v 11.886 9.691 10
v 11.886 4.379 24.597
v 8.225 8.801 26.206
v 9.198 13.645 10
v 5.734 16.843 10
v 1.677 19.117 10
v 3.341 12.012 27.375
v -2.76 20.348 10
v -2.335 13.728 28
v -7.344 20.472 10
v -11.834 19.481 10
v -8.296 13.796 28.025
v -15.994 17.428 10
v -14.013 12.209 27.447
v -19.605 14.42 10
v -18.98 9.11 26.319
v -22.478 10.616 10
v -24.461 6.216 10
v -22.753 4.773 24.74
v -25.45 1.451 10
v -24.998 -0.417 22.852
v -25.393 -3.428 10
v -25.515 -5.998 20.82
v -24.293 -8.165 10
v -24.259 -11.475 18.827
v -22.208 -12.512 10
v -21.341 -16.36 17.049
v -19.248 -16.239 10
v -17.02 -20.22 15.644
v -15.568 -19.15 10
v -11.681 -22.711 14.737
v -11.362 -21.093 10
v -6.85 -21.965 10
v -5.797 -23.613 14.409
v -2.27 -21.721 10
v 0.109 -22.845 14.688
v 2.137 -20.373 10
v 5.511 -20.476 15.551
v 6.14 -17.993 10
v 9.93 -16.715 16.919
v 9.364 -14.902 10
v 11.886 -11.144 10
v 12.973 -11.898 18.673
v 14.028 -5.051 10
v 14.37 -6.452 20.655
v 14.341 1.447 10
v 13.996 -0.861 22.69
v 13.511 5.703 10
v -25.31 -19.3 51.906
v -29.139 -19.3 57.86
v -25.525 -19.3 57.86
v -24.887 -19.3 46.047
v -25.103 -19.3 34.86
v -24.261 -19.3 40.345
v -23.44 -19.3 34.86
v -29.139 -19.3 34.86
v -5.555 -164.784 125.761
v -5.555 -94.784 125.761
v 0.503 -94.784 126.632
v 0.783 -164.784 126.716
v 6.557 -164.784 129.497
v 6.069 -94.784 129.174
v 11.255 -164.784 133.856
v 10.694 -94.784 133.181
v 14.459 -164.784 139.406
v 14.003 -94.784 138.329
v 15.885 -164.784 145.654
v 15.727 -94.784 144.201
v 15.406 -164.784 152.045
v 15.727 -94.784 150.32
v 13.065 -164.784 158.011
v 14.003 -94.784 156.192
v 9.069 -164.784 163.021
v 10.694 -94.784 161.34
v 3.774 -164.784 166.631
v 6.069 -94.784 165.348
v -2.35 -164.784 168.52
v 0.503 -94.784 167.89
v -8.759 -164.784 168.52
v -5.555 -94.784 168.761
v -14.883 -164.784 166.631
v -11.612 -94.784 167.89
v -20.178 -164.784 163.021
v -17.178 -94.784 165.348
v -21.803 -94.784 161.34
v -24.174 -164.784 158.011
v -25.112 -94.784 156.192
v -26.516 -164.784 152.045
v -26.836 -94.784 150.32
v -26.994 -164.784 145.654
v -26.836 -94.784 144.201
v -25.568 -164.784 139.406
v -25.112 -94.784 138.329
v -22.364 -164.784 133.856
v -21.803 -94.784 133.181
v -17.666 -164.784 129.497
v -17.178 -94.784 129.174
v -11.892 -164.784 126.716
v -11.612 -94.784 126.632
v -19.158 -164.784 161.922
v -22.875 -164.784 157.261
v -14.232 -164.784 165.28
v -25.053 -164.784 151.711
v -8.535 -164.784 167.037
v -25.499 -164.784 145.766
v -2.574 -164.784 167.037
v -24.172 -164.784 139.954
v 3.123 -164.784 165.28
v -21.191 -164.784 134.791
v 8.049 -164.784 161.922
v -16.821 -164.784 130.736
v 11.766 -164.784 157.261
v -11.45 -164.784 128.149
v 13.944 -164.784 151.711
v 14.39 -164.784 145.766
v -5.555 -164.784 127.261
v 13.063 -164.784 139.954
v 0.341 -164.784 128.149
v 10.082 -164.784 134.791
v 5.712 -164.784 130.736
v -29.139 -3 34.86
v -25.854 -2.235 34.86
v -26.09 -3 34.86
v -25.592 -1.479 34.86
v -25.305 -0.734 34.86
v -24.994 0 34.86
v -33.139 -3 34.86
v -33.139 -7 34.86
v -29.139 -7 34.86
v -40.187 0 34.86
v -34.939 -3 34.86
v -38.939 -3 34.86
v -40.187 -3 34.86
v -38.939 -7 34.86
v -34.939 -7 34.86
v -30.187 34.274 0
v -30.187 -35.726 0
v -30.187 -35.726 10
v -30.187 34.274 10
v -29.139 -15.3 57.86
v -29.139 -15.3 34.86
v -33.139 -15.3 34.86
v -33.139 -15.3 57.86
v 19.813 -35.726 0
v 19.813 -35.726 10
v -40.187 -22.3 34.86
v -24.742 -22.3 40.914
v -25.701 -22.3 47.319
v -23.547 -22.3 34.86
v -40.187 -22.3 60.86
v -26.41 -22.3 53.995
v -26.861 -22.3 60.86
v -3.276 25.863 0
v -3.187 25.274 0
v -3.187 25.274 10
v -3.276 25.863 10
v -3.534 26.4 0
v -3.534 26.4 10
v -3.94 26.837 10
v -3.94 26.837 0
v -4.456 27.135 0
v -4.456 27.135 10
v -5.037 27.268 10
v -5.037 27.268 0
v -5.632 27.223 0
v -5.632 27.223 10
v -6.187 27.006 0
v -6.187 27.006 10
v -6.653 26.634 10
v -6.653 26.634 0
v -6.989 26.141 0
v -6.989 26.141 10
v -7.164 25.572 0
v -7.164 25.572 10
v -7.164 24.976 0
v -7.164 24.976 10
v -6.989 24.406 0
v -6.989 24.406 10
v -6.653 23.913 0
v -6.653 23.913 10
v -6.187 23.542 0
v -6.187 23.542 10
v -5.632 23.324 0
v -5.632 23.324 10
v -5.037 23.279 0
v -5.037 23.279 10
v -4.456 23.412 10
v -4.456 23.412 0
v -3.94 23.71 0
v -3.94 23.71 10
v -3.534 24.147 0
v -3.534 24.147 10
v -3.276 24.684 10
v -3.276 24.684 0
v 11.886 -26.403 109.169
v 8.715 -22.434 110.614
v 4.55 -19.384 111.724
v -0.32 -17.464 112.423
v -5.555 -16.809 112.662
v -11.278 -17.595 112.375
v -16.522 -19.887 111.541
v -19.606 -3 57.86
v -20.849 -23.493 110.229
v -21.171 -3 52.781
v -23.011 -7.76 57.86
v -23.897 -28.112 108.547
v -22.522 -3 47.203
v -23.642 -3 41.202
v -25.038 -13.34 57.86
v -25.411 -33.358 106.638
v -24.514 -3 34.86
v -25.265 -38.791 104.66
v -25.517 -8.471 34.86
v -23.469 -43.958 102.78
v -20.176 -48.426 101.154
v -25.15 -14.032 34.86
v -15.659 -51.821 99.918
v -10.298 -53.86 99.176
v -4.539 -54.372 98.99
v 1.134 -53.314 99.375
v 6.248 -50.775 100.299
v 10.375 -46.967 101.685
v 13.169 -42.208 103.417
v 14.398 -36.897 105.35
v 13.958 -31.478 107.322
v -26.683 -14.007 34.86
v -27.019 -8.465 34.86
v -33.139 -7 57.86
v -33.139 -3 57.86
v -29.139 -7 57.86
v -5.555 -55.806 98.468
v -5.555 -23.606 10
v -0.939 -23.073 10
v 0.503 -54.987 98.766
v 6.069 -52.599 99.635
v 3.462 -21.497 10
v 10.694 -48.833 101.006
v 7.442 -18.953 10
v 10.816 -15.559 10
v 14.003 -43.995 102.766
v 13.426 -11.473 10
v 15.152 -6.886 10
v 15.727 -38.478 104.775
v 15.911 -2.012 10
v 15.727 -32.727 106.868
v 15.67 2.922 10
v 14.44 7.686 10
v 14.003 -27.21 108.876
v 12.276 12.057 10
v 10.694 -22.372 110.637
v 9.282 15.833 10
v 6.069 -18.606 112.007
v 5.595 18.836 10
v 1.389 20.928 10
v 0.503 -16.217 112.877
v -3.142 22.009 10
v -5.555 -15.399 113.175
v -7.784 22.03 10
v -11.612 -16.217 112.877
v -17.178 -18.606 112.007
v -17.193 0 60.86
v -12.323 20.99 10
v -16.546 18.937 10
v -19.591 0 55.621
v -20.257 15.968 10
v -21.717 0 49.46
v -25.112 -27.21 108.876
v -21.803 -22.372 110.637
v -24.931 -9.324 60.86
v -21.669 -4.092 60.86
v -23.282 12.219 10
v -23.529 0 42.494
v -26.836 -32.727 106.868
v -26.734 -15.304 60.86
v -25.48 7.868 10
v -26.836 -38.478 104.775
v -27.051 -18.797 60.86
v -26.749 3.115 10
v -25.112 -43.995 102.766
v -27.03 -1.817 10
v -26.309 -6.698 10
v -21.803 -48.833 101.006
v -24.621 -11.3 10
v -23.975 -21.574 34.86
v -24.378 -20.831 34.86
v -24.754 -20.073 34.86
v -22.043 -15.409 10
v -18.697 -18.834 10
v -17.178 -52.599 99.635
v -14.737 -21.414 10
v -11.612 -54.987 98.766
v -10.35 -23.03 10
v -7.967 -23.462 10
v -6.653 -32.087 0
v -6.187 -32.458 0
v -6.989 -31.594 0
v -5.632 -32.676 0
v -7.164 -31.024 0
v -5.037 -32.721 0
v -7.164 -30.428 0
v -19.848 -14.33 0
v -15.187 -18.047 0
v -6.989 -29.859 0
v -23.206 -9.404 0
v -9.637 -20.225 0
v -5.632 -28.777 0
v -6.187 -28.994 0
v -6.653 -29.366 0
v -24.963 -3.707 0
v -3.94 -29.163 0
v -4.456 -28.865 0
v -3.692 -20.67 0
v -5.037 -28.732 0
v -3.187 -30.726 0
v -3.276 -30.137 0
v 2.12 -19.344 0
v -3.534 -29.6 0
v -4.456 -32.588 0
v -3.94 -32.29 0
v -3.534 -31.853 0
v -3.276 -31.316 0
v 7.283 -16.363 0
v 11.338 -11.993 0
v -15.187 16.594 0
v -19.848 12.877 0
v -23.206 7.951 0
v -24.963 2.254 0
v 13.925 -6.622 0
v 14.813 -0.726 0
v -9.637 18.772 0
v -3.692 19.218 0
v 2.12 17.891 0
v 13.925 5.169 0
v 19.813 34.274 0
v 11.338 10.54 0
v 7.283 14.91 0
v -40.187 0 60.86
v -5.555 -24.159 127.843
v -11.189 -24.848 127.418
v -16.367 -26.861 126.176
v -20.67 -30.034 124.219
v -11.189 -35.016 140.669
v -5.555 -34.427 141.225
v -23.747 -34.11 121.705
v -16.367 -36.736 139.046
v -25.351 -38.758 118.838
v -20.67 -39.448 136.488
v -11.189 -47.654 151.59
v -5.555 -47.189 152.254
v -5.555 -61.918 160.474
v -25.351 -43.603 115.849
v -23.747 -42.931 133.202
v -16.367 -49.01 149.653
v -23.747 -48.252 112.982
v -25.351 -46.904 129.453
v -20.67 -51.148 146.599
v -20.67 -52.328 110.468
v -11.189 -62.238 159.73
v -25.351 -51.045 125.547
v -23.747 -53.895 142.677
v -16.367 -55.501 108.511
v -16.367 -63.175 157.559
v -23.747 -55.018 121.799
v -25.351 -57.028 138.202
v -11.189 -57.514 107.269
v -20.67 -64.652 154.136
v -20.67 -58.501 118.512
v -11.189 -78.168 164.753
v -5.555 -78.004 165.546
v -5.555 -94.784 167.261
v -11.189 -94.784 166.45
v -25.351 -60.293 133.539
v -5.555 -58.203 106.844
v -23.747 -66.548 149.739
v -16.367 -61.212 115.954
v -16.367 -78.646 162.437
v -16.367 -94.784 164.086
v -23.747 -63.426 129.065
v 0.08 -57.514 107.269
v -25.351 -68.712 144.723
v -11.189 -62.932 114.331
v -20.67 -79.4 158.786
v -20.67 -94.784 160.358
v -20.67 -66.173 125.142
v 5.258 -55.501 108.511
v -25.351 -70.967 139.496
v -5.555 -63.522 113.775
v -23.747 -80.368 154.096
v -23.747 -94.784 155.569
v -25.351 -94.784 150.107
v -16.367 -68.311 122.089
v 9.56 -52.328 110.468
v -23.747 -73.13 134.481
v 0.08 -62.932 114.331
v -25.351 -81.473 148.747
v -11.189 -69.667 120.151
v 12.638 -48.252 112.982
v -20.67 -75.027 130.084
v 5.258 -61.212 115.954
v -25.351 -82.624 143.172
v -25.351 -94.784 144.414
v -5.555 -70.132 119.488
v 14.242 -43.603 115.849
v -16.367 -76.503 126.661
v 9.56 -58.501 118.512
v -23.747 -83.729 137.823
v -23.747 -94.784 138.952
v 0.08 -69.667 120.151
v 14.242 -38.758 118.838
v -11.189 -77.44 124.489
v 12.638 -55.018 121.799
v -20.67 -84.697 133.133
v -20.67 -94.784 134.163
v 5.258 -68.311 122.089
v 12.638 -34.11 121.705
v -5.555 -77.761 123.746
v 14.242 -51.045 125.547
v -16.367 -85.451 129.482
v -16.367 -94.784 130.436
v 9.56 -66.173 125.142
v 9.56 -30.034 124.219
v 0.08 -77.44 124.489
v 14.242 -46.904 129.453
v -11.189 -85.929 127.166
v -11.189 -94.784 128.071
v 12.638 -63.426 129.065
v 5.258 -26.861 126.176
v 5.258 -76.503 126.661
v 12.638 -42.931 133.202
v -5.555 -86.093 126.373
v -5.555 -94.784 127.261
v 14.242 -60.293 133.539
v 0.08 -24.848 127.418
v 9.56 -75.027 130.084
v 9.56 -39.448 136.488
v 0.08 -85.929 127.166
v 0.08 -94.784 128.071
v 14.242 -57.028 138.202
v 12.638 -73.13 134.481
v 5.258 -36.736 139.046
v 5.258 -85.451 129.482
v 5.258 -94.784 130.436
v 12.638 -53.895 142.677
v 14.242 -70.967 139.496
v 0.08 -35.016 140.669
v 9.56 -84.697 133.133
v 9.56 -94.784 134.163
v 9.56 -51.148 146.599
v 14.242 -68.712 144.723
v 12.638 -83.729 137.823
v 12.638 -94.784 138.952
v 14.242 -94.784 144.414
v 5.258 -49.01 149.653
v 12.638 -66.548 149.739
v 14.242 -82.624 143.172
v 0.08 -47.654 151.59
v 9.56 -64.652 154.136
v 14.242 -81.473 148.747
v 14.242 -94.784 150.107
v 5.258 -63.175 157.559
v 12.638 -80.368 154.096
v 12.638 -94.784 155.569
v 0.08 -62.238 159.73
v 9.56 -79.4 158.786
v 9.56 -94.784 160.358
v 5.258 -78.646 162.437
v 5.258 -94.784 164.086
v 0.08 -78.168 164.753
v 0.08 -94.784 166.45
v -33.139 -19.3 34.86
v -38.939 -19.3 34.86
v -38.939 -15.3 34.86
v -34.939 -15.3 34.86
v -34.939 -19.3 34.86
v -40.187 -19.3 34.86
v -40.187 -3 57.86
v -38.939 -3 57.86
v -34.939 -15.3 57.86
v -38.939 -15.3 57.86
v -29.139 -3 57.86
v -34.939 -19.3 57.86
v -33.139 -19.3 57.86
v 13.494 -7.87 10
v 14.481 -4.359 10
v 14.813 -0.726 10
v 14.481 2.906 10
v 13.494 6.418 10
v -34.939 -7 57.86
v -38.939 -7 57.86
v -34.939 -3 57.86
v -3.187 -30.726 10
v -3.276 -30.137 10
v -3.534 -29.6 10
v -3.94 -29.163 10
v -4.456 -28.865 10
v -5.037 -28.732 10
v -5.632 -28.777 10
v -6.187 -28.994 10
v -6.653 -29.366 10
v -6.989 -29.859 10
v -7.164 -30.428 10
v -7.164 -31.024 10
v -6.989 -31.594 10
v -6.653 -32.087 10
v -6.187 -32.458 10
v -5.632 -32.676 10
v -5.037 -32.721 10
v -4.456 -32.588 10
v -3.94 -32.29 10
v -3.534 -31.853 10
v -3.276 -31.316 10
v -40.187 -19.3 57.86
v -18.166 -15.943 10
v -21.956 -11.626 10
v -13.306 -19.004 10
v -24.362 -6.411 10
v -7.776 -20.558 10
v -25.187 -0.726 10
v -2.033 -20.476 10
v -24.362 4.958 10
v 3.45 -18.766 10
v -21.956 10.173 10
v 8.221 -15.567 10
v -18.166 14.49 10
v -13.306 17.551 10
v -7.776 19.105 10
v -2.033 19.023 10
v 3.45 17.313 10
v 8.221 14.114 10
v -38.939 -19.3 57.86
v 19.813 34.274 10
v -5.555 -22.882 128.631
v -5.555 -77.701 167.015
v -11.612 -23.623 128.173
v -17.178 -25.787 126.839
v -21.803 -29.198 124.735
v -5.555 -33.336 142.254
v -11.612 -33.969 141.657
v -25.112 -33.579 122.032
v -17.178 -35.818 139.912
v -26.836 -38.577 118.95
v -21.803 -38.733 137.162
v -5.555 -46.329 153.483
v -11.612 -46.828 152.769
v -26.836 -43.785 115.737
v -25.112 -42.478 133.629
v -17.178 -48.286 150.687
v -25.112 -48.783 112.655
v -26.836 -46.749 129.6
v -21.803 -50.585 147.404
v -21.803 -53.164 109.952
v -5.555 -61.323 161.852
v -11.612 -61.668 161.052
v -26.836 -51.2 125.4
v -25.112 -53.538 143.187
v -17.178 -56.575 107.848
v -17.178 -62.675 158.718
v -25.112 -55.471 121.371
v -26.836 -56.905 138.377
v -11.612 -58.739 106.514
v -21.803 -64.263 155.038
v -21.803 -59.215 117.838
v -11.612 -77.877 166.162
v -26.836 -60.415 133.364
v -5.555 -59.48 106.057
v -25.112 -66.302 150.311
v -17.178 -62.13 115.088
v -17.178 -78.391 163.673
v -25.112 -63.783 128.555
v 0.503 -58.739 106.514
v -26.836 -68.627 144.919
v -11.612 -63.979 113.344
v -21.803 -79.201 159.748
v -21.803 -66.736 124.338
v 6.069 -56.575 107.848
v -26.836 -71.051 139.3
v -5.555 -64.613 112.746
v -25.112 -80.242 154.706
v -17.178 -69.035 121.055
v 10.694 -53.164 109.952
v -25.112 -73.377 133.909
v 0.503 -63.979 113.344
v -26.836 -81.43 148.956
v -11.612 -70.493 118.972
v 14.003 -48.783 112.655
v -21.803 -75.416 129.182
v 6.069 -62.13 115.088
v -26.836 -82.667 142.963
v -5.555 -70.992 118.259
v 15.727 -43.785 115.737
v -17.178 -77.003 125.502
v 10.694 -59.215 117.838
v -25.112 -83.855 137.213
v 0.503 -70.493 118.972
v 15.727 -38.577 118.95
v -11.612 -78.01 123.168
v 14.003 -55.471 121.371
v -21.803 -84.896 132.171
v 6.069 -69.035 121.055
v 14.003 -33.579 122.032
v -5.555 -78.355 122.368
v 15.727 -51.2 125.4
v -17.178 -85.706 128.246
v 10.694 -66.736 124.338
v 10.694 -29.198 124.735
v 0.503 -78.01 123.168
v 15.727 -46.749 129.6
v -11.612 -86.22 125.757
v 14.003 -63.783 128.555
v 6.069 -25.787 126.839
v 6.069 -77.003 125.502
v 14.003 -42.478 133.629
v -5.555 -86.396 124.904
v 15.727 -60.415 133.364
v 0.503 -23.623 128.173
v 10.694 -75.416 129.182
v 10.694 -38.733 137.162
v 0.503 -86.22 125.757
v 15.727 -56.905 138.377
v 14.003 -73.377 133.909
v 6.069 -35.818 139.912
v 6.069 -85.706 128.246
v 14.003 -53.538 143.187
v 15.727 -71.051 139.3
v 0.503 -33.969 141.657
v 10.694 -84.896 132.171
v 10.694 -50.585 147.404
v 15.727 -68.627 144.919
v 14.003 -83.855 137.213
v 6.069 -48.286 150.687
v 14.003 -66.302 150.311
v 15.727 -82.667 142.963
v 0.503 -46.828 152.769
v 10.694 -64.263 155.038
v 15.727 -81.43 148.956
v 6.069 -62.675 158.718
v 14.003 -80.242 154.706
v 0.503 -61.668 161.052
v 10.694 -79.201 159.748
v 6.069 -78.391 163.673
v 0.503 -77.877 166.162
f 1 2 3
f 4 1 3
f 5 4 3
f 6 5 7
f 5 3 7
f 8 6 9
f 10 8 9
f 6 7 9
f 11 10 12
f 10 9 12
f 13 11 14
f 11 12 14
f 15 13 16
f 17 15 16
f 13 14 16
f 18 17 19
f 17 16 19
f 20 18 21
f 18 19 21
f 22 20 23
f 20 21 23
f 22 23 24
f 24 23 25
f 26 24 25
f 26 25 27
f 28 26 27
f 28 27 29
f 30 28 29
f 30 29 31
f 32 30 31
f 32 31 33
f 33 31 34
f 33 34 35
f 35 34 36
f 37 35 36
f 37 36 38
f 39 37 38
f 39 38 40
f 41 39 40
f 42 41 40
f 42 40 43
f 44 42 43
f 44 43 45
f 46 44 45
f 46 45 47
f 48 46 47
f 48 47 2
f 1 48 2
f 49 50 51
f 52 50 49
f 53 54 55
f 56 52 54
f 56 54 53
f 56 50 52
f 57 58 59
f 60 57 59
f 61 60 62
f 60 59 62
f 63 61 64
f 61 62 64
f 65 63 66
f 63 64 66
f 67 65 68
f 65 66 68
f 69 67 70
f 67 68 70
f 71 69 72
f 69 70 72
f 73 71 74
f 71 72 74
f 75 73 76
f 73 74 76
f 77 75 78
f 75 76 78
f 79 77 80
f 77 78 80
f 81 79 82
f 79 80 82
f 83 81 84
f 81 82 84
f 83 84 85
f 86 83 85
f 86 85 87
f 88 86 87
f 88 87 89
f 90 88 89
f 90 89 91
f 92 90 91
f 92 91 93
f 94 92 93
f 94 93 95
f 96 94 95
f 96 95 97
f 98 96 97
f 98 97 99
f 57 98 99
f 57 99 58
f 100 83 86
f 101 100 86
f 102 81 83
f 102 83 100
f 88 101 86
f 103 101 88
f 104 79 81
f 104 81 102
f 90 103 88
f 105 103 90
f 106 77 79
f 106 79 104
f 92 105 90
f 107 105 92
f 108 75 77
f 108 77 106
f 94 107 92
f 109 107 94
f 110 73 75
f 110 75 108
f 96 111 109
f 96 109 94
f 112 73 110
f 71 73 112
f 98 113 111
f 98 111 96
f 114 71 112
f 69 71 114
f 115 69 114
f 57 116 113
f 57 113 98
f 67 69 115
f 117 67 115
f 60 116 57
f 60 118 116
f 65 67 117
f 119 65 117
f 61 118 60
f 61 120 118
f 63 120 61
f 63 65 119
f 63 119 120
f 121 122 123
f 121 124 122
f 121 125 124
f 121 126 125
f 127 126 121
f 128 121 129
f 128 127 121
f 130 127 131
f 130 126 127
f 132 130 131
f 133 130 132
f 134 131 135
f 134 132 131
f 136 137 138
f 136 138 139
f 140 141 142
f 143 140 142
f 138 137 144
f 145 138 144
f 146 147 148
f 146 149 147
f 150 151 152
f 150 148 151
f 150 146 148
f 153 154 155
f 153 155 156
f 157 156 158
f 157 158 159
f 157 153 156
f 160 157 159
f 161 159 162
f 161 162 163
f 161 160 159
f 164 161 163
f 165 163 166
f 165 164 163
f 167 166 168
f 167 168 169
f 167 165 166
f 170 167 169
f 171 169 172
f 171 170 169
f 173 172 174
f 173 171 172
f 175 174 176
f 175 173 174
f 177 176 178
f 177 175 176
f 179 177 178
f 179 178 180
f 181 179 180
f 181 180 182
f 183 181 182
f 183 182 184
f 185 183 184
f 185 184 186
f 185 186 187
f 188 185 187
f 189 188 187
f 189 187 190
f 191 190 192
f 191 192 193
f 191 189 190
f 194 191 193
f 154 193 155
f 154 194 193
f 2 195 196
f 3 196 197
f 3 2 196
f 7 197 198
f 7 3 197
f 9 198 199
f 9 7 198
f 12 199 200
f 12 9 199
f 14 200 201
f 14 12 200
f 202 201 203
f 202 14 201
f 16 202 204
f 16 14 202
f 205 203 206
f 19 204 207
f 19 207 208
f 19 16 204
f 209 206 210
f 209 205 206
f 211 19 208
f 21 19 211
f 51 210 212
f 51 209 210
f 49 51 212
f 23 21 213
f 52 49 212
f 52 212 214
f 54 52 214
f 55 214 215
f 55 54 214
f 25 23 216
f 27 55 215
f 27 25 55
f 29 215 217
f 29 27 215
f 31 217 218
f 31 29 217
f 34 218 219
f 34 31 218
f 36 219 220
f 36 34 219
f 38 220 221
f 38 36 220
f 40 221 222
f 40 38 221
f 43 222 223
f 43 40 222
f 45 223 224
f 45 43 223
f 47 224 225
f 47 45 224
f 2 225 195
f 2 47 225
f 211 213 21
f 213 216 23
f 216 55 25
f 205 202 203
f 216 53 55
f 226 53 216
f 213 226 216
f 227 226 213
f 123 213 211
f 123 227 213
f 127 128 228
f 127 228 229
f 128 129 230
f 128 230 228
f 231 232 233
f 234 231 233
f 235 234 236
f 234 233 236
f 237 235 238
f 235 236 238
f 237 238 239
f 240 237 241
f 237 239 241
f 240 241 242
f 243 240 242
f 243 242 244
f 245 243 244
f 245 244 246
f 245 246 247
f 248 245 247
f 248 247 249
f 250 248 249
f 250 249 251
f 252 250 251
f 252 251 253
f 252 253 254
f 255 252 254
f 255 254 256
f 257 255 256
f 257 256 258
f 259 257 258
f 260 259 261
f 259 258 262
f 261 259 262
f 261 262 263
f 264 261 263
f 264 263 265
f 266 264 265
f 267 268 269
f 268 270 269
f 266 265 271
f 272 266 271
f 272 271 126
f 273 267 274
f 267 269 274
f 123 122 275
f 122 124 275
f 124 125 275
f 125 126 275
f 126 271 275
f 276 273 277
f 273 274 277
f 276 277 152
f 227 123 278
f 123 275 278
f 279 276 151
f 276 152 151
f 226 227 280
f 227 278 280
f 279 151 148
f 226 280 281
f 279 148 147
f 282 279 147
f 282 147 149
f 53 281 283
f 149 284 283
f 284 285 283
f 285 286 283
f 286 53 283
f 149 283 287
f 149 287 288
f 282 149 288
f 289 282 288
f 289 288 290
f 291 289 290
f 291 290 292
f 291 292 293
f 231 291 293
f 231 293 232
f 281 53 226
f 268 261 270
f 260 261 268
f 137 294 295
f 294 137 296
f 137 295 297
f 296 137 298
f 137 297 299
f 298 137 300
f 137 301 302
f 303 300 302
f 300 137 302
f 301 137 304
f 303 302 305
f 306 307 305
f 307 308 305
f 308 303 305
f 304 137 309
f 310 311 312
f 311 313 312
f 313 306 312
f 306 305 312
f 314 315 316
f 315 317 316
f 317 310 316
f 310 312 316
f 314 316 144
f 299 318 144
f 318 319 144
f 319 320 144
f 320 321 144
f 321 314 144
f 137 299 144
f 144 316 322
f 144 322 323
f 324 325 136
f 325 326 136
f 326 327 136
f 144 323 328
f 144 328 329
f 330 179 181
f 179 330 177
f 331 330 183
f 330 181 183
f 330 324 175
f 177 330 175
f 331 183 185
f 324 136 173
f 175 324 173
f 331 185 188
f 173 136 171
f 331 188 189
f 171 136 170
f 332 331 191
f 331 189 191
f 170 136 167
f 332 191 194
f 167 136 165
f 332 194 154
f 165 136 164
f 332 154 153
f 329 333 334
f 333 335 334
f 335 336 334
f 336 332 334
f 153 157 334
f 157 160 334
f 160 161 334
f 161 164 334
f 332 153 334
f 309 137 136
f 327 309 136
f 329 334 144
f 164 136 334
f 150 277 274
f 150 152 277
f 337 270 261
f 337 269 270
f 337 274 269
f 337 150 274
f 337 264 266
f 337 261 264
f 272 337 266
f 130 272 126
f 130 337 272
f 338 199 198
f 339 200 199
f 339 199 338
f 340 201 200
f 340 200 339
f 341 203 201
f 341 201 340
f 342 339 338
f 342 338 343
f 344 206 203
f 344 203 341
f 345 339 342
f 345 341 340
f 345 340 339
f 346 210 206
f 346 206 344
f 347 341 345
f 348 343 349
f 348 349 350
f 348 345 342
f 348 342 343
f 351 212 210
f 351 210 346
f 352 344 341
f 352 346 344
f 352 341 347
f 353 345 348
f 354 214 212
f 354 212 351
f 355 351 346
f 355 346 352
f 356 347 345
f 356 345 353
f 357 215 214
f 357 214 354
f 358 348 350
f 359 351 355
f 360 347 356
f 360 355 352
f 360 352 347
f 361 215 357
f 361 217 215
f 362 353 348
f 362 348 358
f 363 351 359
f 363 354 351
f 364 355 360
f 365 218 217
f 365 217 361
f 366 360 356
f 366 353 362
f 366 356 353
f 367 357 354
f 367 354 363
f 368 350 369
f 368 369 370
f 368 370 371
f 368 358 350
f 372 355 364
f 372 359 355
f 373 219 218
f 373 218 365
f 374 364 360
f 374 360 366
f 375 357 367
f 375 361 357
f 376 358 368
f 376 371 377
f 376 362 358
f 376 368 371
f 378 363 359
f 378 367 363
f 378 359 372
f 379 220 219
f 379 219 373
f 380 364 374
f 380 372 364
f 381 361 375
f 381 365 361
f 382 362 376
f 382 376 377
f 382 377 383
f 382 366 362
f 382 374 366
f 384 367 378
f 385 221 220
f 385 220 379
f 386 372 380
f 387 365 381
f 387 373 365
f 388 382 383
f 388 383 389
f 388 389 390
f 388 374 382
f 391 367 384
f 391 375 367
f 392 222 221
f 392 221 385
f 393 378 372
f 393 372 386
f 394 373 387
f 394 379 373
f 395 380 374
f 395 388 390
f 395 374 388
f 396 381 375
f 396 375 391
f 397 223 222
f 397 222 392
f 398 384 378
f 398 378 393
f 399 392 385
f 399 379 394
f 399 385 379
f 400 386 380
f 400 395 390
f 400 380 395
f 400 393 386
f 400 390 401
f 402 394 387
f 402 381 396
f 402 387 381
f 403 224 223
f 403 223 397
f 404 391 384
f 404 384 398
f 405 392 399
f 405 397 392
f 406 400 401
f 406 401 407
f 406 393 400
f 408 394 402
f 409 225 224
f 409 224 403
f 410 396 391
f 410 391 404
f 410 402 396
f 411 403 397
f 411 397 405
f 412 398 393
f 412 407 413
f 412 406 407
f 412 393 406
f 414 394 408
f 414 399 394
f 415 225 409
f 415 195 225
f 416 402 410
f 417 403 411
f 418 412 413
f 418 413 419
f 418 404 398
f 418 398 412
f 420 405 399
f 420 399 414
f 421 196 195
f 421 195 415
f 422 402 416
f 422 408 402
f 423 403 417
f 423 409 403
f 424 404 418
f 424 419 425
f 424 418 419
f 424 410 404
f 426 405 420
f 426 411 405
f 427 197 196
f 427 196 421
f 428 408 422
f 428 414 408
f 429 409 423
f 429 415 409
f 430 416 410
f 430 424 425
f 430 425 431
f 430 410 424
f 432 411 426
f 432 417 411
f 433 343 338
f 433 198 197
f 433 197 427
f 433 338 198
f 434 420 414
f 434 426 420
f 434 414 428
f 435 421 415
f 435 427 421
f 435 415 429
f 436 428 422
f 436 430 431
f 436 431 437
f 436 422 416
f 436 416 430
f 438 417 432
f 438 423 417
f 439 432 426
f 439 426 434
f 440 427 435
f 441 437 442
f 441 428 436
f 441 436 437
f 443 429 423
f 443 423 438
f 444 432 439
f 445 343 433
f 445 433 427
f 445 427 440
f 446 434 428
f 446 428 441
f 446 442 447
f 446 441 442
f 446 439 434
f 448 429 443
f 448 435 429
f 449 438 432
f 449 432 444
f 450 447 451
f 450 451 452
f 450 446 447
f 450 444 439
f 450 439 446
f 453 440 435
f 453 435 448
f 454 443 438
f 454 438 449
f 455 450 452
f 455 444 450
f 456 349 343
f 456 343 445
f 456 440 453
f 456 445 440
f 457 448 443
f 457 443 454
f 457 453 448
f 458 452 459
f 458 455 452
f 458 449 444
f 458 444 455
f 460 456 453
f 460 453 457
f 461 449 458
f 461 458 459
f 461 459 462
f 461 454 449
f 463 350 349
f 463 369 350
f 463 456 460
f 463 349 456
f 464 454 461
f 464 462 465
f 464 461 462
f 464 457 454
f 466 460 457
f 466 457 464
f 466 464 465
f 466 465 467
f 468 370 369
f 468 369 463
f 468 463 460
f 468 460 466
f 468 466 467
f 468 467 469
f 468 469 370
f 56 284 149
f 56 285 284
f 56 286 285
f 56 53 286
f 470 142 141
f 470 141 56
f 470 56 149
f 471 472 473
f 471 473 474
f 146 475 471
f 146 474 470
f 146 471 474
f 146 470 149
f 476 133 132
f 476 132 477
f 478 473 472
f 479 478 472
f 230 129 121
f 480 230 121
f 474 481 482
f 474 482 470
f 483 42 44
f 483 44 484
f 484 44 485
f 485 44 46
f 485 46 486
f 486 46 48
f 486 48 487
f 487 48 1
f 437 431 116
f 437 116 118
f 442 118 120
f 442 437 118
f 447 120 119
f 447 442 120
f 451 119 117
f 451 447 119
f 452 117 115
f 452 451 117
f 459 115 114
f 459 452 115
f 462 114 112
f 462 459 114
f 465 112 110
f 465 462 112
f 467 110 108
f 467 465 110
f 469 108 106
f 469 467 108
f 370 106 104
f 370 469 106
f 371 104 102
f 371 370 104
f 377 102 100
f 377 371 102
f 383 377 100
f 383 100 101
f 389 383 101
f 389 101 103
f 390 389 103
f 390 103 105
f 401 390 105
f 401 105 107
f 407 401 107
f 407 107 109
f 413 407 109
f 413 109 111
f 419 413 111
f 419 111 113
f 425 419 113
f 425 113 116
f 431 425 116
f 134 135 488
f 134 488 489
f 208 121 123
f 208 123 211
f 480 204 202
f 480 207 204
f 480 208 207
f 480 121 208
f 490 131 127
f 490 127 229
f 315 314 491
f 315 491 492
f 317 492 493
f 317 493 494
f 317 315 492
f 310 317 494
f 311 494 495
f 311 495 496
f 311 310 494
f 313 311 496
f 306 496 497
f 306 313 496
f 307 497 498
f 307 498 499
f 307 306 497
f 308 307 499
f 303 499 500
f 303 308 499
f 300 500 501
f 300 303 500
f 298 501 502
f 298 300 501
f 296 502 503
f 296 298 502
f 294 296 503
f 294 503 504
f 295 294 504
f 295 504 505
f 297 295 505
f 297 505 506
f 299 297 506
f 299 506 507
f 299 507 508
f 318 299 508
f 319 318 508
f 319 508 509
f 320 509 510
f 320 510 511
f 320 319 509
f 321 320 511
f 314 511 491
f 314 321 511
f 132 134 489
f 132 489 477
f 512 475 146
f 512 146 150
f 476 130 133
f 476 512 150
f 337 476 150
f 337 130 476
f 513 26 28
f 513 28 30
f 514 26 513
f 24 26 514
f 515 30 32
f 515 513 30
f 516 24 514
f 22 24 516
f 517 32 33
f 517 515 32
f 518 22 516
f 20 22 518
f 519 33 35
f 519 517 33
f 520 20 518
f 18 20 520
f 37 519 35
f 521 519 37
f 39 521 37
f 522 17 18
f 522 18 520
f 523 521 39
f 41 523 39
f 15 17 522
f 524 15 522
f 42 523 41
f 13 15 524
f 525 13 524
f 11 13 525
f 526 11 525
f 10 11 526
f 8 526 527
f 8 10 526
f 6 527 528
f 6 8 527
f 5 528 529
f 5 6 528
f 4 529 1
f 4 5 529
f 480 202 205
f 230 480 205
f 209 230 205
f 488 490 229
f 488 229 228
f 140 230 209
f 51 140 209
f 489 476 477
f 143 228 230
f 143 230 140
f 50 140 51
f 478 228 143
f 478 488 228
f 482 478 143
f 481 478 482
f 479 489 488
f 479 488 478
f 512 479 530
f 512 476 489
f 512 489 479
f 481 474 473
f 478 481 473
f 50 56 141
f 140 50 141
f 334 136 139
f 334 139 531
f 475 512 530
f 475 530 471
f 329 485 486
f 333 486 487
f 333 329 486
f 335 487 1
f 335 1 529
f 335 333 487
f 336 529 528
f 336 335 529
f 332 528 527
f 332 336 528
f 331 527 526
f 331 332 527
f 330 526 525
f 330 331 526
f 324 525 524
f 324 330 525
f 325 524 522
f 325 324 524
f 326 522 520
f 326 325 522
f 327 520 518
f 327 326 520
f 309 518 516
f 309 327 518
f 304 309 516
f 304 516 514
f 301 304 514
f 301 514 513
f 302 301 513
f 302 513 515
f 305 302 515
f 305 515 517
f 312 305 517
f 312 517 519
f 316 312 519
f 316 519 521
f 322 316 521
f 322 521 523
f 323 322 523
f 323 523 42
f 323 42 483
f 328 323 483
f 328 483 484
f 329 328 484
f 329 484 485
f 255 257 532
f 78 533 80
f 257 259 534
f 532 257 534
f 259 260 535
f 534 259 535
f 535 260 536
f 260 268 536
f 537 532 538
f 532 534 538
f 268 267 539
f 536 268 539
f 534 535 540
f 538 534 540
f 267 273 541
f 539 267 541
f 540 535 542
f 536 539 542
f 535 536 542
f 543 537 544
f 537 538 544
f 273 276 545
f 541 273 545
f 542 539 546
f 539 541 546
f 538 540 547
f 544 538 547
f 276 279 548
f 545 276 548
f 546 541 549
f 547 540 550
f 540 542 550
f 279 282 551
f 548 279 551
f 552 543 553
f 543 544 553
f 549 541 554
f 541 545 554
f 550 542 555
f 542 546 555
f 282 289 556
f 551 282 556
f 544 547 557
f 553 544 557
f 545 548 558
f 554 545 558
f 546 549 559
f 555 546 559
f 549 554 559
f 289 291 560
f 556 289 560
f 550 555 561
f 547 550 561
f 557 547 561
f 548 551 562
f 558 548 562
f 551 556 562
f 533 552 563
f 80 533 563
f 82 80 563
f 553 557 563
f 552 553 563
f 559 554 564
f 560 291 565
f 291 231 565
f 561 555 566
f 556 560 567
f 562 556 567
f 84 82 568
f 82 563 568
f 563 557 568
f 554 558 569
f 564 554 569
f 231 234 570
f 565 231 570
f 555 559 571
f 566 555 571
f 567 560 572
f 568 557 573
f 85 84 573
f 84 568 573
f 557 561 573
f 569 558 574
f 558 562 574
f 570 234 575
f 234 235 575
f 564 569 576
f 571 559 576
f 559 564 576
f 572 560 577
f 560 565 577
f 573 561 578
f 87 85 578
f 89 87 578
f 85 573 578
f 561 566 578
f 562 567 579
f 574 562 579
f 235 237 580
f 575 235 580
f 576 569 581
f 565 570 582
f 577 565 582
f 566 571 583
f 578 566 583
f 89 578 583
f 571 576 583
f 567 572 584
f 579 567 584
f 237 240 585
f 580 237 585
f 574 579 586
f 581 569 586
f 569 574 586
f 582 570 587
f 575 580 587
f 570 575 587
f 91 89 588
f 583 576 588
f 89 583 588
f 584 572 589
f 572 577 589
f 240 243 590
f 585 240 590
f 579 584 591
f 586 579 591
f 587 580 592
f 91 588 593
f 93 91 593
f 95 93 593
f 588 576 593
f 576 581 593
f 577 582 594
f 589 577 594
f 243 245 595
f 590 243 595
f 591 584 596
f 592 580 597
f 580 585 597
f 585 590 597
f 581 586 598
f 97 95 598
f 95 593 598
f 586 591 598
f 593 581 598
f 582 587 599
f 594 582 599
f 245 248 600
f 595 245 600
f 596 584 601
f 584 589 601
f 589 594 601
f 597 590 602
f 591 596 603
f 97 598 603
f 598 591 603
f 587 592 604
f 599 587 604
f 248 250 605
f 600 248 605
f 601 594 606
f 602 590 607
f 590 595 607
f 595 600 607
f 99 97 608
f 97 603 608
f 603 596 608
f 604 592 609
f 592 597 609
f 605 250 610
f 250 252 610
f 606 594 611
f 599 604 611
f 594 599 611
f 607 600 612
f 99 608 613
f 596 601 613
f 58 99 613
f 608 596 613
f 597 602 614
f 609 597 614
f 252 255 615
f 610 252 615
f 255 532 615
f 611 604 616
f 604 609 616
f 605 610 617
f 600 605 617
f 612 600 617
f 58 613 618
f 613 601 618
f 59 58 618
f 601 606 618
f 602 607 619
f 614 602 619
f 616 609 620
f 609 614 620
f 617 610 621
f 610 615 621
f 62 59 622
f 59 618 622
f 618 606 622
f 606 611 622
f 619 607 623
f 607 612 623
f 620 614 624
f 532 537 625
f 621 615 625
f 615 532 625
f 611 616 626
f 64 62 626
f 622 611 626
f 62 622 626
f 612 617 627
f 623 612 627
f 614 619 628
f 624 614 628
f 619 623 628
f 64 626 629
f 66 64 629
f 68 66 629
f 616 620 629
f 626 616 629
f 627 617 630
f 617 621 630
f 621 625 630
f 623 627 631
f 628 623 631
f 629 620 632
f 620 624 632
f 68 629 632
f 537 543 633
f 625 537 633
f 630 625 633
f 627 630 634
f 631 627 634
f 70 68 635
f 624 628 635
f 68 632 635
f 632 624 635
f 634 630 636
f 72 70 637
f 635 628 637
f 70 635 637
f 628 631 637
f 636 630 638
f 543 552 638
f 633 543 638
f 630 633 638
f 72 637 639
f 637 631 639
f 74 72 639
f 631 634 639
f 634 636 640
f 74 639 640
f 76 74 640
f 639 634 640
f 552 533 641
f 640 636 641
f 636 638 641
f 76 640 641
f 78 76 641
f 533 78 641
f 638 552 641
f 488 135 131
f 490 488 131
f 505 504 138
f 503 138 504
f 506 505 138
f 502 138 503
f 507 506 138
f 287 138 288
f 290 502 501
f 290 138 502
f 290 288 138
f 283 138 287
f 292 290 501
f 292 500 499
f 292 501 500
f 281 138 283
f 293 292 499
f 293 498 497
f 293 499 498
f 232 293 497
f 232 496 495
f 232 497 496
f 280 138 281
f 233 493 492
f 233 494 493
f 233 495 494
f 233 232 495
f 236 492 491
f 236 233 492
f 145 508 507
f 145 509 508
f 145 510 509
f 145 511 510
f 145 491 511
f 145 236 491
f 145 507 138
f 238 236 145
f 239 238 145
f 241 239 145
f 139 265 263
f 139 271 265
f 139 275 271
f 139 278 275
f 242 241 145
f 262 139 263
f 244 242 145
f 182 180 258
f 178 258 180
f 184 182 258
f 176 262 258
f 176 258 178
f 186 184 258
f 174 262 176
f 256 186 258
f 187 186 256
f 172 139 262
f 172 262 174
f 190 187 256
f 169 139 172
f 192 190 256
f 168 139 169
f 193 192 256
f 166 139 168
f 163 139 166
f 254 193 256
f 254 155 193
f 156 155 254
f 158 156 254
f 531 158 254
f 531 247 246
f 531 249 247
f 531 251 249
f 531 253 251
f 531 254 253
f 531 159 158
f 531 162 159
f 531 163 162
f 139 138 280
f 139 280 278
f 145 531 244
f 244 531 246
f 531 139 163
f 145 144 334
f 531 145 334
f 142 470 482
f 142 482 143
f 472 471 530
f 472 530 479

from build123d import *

# Parameters (mm, degrees)
ESQUISSE1_W                         = 50
ESQUISSE1_H                         = 70
ESQUISSE1_R                         = 2
ESQUISSE1_R_2                       = 20
BOSS_EXTRU_1_DEPTH                  = 10
BOSS_EXTRU_2_REACH                  = 57.317
ESQUISSE13_R                        = 21.5
ESQUISSE13_R_2                      = 20
BOSS_EXTRU_2_DIRECTION_2_DEPTH      = 90
ESQUISSE19_R                        = 21.5
ESQUISSE19_R_2                      = 20
R_VOLUTION5_ANGLE                   = 70
ESQUISSE23_R                        = 21.5
ESQUISSE23_R_2                      = 20
BOSS_EXTRU_3_DEPTH                  = 70
ESQUISSE24_W                        = 23
ESQUISSE24_H                        = 16.3
ENL_V_MAT_EXTRU_1_DEPTH             = 10
BOSS_EXTRU_4_DEPTH                  = 13
BOSS_EXTRU_4_DIRECTION_2_REACH      = 242.506
BOSS_EXTRU_4_DIRECTION_2_END_RADIUS = 21.5
ESQUISSE28_W                        = 4
ESQUISSE28_H                        = 4
BOSS_EXTRU_5_DEPTH                  = 23


with BuildPart() as part:
    # Esquisse1 → Boss.-Extru.1 (new body)
    with BuildSketch(Plane.XY):
        with Locations((-5.186655458, -0.726415094)):
            Rectangle(ESQUISSE1_W, ESQUISSE1_H)
        with Locations((-5.186655458, 25.273584906)):
            Circle(ESQUISSE1_R, mode=Mode.SUBTRACT)
        with Locations((-5.186655458, -30.726415094)):
            Circle(ESQUISSE1_R, mode=Mode.SUBTRACT)
        with Locations((-5.186655458, -0.726415094)):
            Circle(ESQUISSE1_R_2, mode=Mode.SUBTRACT)
    extrude(amount=BOSS_EXTRU_1_DEPTH)

    # Boss.-Extru.2: up to this plane
    boss_extru_2_end = Plane(origin=(0, 0, 10), z_dir=(0, 0, 1))
    # Esquisse13 → Boss.-Extru.2 (add, up to the surface)
    with BuildSketch(Plane(origin=(0, -7.393134718, 20.312470696), x_dir=(1, 0, 0), z_dir=(0, -0.34202014332566283, 0.9396926207859106)), mode=Mode.PRIVATE) as boss_extru_2_sk1:
        with Locations(Location((-5.554517745, 2.737594529, 0), (0, 0, 270))):
            Circle(ESQUISSE13_R)
        with Locations(Location((-5.554517745, 2.737594529, 0), (0, 0, 29.306498897))):
            Circle(ESQUISSE13_R_2, mode=Mode.SUBTRACT)
    boss_extru_2_tool1 = split(extrude(boss_extru_2_sk1.sketch, amount=-BOSS_EXTRU_2_REACH, mode=Mode.PRIVATE), bisect_by=boss_extru_2_end, keep=Keep.BOTH, mode=Mode.PRIVATE)
    add(boss_extru_2_tool1.solids().sort_by_distance((-5.554518, 14.811316, 28.39423))[0])

    # Esquisse13 → Boss.-Extru.2 direction 2 (add)
    with BuildSketch(Plane(origin=(0, -7.393134718, 20.312470696), x_dir=(1, 0, 0), z_dir=(0, -0.34202014332566283, 0.9396926207859106))):
        with Locations(Location((-5.554517745, 2.737594529, 0), (0, 0, 270))):
            Circle(ESQUISSE13_R)
        with Locations(Location((-5.554517745, 2.737594529, 0), (0, 0, 29.306498897))):
            Circle(ESQUISSE13_R_2, mode=Mode.SUBTRACT)
    extrude(amount=BOSS_EXTRU_2_DIRECTION_2_DEPTH)

    # Esquisse19 → Révolution5 (revolve)
    with BuildSketch(Plane(origin=(0, -38.174947617, 104.884806567), x_dir=(1, 0, 0), z_dir=(0, -0.34202014332566294, 0.9396926207859106))):
        with Locations(Location((-5.554517745, 2.737594529, 0), (0, 0, 90))):
            Circle(ESQUISSE19_R)
        with Locations(Location((-5.554517745, 2.737594529, 0), (0, 0, 90))):
            Circle(ESQUISSE19_R_2, mode=Mode.SUBTRACT)
    revolve(axis=Axis((-5.554579986, -94.784211414, 84.280719561), (1, 0, 0)), revolution_arc=R_VOLUTION5_ANGLE)

    # Esquisse23 → Boss.-Extru.3 (add)
    with BuildSketch(Plane.XZ.offset(94.784211414)):
        with Locations(Location((-5.554579986, 147.260634339, 0), (0, 0, 270))):
            Circle(ESQUISSE23_R)
        with Locations(Location((-5.554579986, 147.260634339, 0), (0, 0, 270.000178307))):
            Circle(ESQUISSE23_R_2, mode=Mode.SUBTRACT)
    extrude(amount=BOSS_EXTRU_3_DEPTH)

    # Esquisse24 → Enlèv. mat.-Extru.1 (cut)
    with BuildSketch(Plane.ZY.offset(27.186655458)):
        with Locations((46.360115203, -11.15)):
            Rectangle(ESQUISSE24_W, ESQUISSE24_H)
    extrude(amount=-ENL_V_MAT_EXTRU_1_DEPTH, mode=Mode.SUBTRACT)



with BuildPart() as body_2:
    # Esquisse27 → Boss.-Extru.4 (new body)
    with BuildSketch(Plane.ZY.offset(27.186655458)):
        Polygon((60.860115203, 0), (34.860115203, 0), (34.860115203, -3), (57.860115203, -3), (57.860115203, -19.3), (34.860115203, -19.3), (34.860115203, -22.3), (60.860115203, -22.3), align=None)
    extrude(amount=BOSS_EXTRU_4_DEPTH)

    # Boss.-Extru.4 direction 2: up to this cylinder (the profile starts outside it)
    boss_extru_4_direction_2_end = Plane(origin=(-5.554517745, -12.849515831, 43.307945529), z_dir=(0, 0.34202014332566283, -0.9396926207859105)) * Cylinder(BOSS_EXTRU_4_DIRECTION_2_END_RADIUS, 529.012, mode=Mode.PRIVATE)
    # Esquisse27 → Boss.-Extru.4 direction 2 (add, up to the surface)
    with BuildSketch(Plane.ZY.offset(27.186655458), mode=Mode.PRIVATE) as boss_extru_4_direction_2_sk1:
        Polygon((60.860115203, 0), (34.860115203, 0), (34.860115203, -3), (57.860115203, -3), (57.860115203, -19.3), (34.860115203, -19.3), (34.860115203, -22.3), (60.860115203, -22.3), align=None)
    boss_extru_4_direction_2_tool1 = extrude(boss_extru_4_direction_2_sk1.sketch, amount=-BOSS_EXTRU_4_DIRECTION_2_REACH, mode=Mode.PRIVATE) - boss_extru_4_direction_2_end
    add(boss_extru_4_direction_2_tool1.solids().sort_by_distance((-27.186655, -0.342533, 47.860115))[0])


with BuildPart() as part_1:
    add(part.part)

    add(body_2.part)  # Boss.-Extru.5 merges body 2
    # Esquisse28 → Boss.-Extru.5 (add)
    with BuildSketch(Plane(origin=(0, 0, 34.860115203), x_dir=(-1, 0, 0), z_dir=(0, 0, -1))):
        with Locations((31.138517686, -5)):
            Rectangle(ESQUISSE28_W, ESQUISSE28_H)
        with Locations((36.938517686, -5)):
            Rectangle(ESQUISSE28_W, ESQUISSE28_H)
        with Locations((31.138517686, -17.3)):
            Rectangle(ESQUISSE28_W, ESQUISSE28_H)
        with Locations((36.938517686, -17.3)):
            Rectangle(ESQUISSE28_W, ESQUISSE28_H)
    extrude(amount=-BOSS_EXTRU_5_DEPTH)


solid = part_1.part
